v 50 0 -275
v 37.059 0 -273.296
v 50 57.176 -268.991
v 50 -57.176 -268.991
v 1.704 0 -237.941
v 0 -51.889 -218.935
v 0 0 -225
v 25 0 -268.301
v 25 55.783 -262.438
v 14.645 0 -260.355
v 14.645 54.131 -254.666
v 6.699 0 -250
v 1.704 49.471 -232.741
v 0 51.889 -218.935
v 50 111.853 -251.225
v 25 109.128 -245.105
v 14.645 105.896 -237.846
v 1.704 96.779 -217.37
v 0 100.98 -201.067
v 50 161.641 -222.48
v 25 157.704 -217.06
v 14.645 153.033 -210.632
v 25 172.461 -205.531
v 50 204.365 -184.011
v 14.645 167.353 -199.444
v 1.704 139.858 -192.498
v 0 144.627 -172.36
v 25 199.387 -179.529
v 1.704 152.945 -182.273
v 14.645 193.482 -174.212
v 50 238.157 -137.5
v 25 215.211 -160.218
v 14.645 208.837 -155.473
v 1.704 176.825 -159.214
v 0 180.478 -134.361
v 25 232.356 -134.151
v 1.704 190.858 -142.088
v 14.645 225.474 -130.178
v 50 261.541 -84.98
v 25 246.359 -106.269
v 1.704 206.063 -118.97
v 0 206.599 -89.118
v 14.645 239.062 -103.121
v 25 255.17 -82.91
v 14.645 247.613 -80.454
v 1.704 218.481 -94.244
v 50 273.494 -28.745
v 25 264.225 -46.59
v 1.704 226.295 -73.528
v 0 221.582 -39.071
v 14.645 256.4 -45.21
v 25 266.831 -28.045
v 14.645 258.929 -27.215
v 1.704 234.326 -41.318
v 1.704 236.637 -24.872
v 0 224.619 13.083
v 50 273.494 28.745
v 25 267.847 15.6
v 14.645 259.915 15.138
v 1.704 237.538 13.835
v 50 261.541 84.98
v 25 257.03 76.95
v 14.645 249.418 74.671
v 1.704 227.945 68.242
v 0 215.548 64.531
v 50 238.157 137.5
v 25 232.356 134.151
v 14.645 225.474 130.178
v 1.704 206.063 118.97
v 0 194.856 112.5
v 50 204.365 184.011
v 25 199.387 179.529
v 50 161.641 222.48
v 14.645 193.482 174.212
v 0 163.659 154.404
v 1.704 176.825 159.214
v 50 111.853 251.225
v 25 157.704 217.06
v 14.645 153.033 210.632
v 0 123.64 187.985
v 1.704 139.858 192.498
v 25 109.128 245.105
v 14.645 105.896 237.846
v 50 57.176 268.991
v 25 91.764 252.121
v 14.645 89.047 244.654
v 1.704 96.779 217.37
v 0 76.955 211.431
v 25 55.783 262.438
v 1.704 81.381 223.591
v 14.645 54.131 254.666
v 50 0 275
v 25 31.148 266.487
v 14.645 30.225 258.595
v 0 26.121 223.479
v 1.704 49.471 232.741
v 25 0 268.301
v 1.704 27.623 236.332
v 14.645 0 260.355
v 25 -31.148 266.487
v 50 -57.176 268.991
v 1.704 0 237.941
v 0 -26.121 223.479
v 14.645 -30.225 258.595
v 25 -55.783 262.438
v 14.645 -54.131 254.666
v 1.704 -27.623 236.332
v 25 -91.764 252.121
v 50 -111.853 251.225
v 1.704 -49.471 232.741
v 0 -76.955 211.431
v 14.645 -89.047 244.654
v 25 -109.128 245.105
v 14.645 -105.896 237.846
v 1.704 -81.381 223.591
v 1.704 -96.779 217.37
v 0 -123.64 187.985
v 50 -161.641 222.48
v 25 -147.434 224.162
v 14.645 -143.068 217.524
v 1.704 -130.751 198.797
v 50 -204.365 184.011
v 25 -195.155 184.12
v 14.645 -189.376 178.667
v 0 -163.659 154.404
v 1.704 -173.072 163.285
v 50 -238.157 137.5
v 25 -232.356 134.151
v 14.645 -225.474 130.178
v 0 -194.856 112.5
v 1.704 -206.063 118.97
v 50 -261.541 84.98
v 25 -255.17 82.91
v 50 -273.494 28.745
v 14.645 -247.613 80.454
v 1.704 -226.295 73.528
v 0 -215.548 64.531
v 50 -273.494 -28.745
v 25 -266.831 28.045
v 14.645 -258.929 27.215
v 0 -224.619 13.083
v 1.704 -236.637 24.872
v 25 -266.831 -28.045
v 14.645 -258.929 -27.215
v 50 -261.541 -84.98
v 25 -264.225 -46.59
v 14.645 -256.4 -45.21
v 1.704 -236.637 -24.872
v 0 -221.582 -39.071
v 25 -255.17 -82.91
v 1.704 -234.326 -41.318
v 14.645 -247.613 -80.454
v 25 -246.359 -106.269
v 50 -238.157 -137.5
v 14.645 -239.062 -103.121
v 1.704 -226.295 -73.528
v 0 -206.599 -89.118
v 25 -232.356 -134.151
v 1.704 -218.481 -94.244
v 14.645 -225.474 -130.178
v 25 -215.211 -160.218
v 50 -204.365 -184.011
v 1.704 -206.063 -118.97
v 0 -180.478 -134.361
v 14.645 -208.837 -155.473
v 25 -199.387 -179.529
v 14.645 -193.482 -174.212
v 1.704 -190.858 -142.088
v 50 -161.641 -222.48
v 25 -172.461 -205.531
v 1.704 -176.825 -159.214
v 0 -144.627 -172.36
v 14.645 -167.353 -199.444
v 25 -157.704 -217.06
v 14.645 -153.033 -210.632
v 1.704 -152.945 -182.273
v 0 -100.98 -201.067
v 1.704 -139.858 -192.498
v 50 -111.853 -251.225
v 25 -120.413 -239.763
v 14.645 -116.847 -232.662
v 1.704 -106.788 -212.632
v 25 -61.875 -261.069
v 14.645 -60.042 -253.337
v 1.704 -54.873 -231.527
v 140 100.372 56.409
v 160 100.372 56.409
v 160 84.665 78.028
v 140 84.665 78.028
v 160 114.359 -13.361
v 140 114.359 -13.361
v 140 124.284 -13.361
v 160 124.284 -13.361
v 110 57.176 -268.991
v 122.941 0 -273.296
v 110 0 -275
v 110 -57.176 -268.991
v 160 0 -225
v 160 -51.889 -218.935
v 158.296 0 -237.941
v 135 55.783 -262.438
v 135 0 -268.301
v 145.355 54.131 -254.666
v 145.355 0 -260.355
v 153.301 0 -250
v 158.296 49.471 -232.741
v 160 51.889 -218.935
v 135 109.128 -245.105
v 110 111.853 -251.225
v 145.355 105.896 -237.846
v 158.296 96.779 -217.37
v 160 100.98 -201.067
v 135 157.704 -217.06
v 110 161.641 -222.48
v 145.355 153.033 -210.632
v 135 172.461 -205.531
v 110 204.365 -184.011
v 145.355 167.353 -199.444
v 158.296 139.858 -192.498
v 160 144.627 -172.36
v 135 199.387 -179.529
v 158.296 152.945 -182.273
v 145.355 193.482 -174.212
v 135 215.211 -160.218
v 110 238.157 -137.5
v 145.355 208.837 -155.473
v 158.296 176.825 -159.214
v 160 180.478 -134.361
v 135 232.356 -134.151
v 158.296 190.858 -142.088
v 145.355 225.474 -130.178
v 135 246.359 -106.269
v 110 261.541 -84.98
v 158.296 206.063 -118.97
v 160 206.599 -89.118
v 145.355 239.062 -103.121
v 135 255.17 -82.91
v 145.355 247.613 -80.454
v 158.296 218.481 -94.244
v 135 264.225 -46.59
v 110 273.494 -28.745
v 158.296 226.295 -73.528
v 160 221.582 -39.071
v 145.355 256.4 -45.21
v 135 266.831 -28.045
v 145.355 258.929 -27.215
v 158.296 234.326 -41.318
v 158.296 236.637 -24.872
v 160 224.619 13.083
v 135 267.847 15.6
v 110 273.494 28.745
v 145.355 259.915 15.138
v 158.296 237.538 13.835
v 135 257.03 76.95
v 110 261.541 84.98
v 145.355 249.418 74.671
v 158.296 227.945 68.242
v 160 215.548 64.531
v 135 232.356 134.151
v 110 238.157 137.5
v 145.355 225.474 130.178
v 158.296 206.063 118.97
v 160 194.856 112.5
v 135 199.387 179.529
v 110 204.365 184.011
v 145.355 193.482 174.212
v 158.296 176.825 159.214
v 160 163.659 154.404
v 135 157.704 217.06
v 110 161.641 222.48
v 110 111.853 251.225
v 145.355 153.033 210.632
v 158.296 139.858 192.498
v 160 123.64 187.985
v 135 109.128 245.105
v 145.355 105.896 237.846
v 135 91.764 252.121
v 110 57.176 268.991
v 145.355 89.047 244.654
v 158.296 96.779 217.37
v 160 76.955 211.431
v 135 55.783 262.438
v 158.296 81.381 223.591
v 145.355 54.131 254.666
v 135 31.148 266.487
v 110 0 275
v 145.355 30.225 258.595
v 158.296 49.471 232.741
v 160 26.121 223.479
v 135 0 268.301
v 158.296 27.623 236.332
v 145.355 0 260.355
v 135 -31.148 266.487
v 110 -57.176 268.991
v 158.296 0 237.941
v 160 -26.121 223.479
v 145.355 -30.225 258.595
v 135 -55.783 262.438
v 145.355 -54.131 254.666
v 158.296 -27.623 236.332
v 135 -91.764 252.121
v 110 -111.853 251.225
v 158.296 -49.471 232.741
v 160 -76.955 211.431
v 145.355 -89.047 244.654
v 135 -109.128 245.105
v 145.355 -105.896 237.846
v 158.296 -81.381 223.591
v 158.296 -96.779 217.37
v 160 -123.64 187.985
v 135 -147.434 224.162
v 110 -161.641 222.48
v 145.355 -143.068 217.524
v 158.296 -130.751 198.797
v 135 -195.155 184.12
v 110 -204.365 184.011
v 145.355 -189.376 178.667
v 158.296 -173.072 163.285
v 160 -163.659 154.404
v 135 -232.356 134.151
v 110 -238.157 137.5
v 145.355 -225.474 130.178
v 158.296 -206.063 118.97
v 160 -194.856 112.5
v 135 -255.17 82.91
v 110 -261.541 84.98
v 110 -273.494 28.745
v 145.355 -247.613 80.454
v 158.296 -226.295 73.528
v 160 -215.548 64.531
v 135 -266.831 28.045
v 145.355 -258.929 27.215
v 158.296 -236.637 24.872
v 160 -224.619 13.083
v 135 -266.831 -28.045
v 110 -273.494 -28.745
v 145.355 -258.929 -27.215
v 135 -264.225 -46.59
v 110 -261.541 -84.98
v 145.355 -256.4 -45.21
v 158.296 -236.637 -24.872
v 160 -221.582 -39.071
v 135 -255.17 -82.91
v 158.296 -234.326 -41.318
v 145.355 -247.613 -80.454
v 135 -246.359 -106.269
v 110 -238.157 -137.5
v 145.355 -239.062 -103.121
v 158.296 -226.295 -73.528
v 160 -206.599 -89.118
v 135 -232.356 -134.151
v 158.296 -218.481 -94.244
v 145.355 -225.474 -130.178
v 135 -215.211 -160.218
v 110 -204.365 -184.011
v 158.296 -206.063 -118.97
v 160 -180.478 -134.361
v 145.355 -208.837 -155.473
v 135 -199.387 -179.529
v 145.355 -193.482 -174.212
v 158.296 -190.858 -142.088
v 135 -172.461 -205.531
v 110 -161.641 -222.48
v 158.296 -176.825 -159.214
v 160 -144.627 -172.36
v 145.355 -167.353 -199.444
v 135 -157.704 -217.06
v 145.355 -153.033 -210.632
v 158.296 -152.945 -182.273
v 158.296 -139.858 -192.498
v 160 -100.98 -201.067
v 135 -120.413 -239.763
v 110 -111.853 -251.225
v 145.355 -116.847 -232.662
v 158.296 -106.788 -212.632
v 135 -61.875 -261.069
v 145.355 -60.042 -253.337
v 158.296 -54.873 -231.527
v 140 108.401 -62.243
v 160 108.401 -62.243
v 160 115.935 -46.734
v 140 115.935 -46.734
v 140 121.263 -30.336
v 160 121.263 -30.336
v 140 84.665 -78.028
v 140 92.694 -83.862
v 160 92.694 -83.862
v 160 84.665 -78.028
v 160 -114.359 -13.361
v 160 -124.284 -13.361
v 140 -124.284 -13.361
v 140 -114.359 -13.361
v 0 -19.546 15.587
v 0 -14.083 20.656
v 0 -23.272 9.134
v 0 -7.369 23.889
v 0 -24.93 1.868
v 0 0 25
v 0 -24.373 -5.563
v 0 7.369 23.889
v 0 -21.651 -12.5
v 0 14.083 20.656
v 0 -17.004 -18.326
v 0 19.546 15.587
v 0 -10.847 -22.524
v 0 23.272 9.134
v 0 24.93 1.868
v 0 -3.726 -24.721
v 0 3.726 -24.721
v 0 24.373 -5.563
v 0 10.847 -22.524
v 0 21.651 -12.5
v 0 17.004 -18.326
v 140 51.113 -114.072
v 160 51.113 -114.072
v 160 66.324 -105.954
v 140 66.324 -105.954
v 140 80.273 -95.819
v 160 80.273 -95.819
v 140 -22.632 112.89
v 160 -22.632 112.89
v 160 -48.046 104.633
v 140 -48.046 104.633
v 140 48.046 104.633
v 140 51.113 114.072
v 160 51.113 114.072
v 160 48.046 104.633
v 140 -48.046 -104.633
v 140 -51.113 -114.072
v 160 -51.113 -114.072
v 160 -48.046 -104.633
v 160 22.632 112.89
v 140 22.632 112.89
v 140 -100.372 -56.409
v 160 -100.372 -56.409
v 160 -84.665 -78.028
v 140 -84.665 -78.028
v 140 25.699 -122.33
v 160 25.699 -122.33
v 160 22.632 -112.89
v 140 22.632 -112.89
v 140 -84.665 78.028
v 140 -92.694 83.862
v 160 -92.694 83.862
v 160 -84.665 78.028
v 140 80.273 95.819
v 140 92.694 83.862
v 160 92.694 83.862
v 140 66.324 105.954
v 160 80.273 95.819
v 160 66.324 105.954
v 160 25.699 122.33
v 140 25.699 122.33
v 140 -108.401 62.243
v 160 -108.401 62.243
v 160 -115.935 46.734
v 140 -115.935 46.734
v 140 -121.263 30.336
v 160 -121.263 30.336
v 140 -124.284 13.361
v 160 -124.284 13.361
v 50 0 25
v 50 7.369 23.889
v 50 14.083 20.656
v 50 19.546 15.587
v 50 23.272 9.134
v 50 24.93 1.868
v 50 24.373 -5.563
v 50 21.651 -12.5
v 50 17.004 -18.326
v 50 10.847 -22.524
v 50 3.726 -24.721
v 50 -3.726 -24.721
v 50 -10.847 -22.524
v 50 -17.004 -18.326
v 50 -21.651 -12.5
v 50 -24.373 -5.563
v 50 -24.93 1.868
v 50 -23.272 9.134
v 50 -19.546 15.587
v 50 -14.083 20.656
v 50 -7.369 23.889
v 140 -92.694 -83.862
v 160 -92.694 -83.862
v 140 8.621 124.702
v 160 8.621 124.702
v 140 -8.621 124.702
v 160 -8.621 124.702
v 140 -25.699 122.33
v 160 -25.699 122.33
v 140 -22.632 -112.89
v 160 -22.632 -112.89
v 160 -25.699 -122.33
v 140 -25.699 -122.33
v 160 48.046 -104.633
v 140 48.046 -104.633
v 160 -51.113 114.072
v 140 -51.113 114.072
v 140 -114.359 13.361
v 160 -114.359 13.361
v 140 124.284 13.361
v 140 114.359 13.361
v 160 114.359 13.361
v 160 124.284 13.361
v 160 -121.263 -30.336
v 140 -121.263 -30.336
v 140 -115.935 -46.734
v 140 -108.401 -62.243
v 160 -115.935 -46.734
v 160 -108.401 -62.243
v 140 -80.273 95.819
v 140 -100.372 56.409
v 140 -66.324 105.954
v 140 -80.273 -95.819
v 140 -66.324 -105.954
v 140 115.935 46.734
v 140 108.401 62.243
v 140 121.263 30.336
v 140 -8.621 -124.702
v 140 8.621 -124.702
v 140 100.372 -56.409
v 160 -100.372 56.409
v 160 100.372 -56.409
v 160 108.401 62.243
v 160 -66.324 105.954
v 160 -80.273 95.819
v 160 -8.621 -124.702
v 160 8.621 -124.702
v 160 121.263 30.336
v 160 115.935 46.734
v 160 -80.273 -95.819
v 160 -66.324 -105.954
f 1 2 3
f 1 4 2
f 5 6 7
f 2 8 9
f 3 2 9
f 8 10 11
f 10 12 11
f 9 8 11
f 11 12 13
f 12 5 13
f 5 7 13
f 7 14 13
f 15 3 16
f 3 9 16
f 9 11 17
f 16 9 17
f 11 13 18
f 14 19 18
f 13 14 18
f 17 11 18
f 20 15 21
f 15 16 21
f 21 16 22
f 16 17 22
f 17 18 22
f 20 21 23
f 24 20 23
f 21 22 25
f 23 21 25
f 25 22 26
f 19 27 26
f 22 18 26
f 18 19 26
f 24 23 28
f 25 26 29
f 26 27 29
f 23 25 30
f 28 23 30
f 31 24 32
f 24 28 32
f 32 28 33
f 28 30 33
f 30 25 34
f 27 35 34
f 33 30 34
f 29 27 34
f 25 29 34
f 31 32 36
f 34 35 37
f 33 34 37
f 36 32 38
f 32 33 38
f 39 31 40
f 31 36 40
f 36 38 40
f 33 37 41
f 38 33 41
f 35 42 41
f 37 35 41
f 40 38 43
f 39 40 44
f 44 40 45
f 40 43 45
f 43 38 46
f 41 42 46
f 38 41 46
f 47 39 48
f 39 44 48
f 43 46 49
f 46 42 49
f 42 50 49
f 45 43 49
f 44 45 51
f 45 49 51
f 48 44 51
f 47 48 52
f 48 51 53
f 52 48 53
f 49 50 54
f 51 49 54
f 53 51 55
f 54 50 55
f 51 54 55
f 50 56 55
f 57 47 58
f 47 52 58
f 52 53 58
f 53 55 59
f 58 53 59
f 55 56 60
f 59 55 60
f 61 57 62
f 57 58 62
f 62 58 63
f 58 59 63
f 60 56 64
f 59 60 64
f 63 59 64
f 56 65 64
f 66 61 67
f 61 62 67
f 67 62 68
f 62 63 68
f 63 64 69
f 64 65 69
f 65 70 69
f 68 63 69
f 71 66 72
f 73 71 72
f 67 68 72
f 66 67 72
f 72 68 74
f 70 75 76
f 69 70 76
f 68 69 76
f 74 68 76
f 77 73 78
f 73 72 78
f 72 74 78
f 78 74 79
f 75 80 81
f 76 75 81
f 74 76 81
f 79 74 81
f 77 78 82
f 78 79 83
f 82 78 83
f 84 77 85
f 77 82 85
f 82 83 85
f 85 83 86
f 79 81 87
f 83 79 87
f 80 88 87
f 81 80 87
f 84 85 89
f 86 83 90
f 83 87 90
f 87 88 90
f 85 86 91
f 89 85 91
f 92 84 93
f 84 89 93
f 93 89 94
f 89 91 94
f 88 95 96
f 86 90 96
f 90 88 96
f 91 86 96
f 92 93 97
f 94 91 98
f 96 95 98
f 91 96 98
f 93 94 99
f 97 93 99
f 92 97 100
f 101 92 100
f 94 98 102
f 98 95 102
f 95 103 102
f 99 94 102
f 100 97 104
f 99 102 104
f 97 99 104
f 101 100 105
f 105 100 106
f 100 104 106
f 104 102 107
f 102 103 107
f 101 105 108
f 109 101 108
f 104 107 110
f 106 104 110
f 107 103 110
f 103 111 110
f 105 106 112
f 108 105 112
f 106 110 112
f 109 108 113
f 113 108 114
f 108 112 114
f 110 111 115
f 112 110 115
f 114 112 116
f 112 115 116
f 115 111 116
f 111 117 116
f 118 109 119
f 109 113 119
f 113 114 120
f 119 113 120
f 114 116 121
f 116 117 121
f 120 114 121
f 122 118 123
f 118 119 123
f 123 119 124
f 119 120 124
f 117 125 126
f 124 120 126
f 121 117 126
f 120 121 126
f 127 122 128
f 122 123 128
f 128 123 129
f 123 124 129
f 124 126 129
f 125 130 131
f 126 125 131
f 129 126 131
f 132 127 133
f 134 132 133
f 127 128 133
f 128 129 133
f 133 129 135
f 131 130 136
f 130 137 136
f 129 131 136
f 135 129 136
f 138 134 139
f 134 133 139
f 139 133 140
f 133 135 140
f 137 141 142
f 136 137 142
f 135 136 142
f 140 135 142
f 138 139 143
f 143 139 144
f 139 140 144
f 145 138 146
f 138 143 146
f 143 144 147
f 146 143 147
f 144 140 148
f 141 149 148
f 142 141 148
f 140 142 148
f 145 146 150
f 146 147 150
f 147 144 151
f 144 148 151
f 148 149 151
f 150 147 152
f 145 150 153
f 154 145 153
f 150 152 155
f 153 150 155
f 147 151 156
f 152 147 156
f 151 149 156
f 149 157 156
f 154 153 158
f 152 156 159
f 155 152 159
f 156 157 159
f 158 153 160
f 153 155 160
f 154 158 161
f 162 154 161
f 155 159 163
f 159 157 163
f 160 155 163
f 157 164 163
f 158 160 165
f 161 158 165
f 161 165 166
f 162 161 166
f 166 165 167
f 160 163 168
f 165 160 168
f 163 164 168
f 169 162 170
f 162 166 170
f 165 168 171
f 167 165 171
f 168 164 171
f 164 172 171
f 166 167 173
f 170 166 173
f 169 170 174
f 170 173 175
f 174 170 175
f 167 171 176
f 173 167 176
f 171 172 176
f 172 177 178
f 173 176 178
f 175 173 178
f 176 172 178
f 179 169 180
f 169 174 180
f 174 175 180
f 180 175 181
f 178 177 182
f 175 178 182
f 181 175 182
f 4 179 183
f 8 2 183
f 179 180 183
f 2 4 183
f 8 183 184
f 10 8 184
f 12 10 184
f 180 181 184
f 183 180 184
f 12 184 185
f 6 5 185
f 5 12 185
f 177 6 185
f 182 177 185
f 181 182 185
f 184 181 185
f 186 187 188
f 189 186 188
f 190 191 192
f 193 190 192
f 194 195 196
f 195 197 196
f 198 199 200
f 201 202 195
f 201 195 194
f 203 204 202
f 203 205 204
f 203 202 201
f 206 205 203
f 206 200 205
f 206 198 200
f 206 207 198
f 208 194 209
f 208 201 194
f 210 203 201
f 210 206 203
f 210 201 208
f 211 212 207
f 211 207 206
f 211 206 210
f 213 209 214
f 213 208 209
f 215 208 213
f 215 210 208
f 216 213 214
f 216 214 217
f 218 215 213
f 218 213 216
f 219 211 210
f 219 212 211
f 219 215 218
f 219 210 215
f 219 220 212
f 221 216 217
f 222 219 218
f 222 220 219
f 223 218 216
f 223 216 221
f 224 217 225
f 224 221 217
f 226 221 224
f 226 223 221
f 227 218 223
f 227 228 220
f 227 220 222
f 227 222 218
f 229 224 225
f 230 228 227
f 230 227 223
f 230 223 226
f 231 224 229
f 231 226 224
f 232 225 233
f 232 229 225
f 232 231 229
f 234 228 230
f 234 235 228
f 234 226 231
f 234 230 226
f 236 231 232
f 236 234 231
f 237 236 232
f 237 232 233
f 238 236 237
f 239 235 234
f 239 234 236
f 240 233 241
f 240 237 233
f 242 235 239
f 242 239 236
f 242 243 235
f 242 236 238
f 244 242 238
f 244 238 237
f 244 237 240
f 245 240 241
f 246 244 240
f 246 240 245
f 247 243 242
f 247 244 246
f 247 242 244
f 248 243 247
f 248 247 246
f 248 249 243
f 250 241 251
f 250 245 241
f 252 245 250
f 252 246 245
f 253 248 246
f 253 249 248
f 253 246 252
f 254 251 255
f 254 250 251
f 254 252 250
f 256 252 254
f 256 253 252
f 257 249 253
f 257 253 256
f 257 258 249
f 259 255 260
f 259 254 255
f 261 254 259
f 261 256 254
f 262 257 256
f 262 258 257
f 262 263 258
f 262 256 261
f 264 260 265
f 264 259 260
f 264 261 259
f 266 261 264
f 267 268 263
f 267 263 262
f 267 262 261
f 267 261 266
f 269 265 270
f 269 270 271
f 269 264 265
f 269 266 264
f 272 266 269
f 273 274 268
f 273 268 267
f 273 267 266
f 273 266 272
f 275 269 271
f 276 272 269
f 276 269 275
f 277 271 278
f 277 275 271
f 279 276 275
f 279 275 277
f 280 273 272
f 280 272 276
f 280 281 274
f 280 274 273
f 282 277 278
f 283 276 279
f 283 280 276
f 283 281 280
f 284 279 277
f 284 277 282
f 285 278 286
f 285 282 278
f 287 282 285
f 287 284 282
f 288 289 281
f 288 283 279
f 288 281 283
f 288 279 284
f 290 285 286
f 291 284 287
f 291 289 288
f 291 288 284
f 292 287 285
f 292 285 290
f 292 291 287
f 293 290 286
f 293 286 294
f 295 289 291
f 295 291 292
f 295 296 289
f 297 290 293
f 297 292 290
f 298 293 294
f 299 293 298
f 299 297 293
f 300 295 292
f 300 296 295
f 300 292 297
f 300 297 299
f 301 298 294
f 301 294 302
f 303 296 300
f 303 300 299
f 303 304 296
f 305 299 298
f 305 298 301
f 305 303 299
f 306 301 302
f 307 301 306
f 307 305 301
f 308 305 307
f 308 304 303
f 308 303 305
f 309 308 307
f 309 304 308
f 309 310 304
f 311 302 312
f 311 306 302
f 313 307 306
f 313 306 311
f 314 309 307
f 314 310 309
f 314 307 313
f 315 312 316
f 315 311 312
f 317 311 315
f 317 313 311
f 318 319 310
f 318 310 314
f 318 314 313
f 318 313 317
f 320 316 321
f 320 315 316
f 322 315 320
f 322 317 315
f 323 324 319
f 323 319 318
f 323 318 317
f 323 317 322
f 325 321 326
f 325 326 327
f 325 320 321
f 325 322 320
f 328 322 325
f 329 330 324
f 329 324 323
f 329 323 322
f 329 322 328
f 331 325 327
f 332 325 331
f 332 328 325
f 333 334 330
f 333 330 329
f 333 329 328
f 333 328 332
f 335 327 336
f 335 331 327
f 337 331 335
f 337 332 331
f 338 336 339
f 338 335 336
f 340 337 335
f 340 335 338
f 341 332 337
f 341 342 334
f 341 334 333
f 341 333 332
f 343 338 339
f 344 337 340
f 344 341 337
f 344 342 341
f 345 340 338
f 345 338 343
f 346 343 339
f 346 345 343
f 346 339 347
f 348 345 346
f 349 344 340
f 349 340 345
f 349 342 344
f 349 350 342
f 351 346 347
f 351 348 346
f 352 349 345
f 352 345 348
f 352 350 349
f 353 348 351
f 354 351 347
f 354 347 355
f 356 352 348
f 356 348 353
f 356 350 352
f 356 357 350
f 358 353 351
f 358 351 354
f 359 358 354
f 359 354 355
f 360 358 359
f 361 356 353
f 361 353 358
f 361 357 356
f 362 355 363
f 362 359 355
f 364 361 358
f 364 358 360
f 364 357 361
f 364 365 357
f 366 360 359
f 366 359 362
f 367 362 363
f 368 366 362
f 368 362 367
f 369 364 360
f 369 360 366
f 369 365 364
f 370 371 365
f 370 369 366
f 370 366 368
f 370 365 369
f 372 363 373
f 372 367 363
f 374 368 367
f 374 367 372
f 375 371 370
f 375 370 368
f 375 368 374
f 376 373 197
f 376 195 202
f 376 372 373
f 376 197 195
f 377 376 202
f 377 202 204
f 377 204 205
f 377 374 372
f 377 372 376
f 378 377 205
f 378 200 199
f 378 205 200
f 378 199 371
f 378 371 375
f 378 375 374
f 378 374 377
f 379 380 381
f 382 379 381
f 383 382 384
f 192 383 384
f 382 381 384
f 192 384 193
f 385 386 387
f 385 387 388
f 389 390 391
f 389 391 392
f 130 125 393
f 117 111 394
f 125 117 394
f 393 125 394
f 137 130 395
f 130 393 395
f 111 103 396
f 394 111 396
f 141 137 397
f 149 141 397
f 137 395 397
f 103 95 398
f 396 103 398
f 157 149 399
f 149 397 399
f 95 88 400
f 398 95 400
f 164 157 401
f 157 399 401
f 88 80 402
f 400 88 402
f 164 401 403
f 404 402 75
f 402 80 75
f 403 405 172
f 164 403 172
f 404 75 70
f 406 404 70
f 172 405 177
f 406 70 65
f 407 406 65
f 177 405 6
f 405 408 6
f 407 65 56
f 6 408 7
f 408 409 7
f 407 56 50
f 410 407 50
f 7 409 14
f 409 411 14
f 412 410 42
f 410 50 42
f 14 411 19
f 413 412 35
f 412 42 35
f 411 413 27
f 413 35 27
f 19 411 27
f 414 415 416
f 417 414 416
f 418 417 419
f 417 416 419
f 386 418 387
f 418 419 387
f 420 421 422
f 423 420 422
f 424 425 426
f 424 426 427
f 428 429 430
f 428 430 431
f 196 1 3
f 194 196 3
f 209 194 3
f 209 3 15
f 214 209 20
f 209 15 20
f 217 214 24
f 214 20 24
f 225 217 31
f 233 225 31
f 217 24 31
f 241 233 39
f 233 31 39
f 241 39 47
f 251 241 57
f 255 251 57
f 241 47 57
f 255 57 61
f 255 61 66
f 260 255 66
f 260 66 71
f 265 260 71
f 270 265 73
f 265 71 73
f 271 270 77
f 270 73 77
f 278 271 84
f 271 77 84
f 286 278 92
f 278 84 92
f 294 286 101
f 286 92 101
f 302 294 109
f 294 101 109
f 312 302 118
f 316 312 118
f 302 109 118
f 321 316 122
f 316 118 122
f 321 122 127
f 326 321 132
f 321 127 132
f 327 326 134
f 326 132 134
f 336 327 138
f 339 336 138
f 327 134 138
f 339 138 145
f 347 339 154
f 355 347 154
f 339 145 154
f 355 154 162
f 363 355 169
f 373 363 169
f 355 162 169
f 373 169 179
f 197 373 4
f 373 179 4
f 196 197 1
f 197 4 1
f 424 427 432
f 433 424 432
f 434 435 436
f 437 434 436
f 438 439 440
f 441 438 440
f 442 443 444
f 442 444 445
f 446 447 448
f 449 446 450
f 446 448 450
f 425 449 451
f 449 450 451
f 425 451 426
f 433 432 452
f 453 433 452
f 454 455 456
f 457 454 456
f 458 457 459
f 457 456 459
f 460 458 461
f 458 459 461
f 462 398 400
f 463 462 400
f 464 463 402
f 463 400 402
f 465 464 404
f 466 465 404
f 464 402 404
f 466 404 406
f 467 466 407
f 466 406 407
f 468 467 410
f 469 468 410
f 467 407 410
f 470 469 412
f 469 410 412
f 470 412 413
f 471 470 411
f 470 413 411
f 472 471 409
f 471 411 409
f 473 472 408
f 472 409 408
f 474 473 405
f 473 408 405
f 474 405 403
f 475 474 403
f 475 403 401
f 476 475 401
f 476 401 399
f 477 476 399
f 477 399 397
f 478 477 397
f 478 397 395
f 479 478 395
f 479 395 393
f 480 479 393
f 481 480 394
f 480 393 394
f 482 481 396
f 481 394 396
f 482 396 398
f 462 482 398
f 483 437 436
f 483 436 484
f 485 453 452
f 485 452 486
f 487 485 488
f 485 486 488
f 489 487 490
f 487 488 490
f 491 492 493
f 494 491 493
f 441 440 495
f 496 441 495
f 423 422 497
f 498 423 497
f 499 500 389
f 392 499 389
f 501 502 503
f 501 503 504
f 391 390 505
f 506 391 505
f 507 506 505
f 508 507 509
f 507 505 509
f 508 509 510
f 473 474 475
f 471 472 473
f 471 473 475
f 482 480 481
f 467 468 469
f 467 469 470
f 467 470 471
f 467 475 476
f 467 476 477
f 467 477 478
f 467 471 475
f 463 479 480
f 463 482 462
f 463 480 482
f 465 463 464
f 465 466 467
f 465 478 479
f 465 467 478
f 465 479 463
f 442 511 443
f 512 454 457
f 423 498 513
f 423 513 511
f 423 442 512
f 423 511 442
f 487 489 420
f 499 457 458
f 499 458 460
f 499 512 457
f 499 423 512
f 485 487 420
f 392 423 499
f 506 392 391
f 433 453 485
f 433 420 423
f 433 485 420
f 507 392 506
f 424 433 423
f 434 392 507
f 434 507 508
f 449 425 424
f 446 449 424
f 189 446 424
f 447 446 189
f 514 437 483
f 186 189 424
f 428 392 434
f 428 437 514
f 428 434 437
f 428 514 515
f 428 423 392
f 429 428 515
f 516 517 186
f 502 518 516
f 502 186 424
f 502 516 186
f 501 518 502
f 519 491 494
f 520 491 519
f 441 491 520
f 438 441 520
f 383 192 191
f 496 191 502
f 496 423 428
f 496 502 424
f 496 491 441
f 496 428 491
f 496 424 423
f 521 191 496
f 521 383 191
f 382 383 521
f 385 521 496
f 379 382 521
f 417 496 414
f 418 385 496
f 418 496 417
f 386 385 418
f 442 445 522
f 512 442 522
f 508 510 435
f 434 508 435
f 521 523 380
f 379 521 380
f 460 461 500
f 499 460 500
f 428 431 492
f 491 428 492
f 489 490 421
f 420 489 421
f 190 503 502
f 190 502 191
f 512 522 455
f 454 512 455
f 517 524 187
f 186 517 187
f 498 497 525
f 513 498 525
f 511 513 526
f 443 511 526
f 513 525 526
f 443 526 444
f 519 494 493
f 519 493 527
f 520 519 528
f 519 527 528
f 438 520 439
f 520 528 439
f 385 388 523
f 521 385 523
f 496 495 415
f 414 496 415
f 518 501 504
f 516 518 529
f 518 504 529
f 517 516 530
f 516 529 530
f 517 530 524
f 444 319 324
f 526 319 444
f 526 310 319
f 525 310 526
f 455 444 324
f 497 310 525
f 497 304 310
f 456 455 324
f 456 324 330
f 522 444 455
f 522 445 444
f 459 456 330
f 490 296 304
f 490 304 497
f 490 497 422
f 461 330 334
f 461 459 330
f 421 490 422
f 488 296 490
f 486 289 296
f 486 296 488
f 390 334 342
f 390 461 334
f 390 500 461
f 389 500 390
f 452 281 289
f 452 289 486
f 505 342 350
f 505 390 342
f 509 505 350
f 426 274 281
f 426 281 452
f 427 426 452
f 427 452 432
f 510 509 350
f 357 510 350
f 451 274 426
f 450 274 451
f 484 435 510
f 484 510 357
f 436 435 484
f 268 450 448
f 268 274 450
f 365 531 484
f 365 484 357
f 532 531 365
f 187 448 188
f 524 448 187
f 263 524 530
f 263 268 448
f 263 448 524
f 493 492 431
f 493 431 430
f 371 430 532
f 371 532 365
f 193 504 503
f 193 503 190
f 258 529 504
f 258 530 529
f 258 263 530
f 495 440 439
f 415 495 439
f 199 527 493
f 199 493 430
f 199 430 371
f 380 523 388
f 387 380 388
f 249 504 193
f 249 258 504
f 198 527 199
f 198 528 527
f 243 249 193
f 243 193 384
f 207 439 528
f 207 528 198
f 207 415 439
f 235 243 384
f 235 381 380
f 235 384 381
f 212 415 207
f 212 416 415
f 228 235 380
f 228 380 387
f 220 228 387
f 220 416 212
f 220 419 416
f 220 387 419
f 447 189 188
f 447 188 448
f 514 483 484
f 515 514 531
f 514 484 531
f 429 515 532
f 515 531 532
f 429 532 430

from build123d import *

# Parameters (mm, degrees)
SKETCH1_R           = 275
BOSS_EXTRUDE1_DEPTH = 160
FILLET1_R           = 50
SKETCH2_R           = 25
CUT_EXTRUDE1_DEPTH  = 50
SKETCH3_R           = 125
CUT_EXTRUDE2_DEPTH  = 20
SKETCH4_W           = 26.72203761
SKETCH4_H           = 21.282518002
BOSS_EXTRUDE2_DEPTH = 77


with BuildPart() as part:
    # Sketch1 → Boss-Extrude1 (new body)
    with BuildSketch(Plane(origin=(0, 0, 0), x_dir=(0, 0, -1), z_dir=(1, 0, 0))):
        Circle(SKETCH1_R)
    extrude(amount=BOSS_EXTRUDE1_DEPTH)

    # Fillet1
    fillet1_edges = [part.edges().sort_by_distance(p)[0] for p in [
        (0, 0, 275),
        (160, 0, 275),
    ]]
    fillet(fillet1_edges, radius=FILLET1_R)

    # Sketch2 → Cut-Extrude1 (cut)
    with BuildSketch(Plane.ZY):
        Circle(SKETCH2_R)
    extrude(amount=-CUT_EXTRUDE1_DEPTH, mode=Mode.SUBTRACT)

    # Sketch3 → Cut-Extrude2 (cut)
    with BuildSketch(Plane(origin=(160, 0, 0), x_dir=(0, 0, -1), z_dir=(1, 0, 0))):
        Circle(SKETCH3_R)
    extrude(amount=-CUT_EXTRUDE2_DEPTH, mode=Mode.SUBTRACT)

    # Sketch4 → Boss-Extrude2 (add)
    with BuildSketch(Plane(origin=(160, 0, 0), x_dir=(0, 0, -1), z_dir=(1, 0, 0))):
        with Locations((0, -125)):
            Rectangle(SKETCH4_W, SKETCH4_H)
        Polygon((-56.409090154, -100.371574733), (-68.918640367, -117.58949348), (-90.537222919, -101.882673861), (-78.027672706, -84.664755114), align=None)
        Polygon((-104.632843949, -48.045878423), (-124.873721378, -54.622538169), (-133.131285124, -29.208370171), (-112.890407695, -22.631710425), align=None)
        Polygon((-112.890407695, 22.631710425), (-133.131285124, 29.208370171), (-124.873721378, 54.622538169), (-104.632843949, 48.045878423), align=None)
        Polygon((-78.027672706, 84.664755114), (-90.537222919, 101.882673861), (-68.918640367, 117.58949348), (-56.409090154, 100.371574733), align=None)
        with Locations((0, 125)):
            Rectangle(SKETCH4_W, SKETCH4_H)
        Polygon((56.409090154, 100.371574733), (68.918640368, 117.58949348), (90.537222919, 101.882673861), (78.027672706, 84.664755114), align=None)
        Polygon((104.632843949, 48.045878423), (124.873721378, 54.622538169), (133.131285124, 29.208370171), (112.890407695, 22.631710425), align=None)
        Polygon((112.890407695, -22.631710425), (133.131285124, -29.208370171), (124.873721378, -54.622538169), (104.632843949, -48.045878423), align=None)
        Polygon((78.027672706, -84.664755114), (90.537222919, -101.882673861), (68.918640367, -117.58949348), (56.409090154, -100.371574733), align=None)
    extrude(amount=-BOSS_EXTRUDE2_DEPTH)


solid = part.part
